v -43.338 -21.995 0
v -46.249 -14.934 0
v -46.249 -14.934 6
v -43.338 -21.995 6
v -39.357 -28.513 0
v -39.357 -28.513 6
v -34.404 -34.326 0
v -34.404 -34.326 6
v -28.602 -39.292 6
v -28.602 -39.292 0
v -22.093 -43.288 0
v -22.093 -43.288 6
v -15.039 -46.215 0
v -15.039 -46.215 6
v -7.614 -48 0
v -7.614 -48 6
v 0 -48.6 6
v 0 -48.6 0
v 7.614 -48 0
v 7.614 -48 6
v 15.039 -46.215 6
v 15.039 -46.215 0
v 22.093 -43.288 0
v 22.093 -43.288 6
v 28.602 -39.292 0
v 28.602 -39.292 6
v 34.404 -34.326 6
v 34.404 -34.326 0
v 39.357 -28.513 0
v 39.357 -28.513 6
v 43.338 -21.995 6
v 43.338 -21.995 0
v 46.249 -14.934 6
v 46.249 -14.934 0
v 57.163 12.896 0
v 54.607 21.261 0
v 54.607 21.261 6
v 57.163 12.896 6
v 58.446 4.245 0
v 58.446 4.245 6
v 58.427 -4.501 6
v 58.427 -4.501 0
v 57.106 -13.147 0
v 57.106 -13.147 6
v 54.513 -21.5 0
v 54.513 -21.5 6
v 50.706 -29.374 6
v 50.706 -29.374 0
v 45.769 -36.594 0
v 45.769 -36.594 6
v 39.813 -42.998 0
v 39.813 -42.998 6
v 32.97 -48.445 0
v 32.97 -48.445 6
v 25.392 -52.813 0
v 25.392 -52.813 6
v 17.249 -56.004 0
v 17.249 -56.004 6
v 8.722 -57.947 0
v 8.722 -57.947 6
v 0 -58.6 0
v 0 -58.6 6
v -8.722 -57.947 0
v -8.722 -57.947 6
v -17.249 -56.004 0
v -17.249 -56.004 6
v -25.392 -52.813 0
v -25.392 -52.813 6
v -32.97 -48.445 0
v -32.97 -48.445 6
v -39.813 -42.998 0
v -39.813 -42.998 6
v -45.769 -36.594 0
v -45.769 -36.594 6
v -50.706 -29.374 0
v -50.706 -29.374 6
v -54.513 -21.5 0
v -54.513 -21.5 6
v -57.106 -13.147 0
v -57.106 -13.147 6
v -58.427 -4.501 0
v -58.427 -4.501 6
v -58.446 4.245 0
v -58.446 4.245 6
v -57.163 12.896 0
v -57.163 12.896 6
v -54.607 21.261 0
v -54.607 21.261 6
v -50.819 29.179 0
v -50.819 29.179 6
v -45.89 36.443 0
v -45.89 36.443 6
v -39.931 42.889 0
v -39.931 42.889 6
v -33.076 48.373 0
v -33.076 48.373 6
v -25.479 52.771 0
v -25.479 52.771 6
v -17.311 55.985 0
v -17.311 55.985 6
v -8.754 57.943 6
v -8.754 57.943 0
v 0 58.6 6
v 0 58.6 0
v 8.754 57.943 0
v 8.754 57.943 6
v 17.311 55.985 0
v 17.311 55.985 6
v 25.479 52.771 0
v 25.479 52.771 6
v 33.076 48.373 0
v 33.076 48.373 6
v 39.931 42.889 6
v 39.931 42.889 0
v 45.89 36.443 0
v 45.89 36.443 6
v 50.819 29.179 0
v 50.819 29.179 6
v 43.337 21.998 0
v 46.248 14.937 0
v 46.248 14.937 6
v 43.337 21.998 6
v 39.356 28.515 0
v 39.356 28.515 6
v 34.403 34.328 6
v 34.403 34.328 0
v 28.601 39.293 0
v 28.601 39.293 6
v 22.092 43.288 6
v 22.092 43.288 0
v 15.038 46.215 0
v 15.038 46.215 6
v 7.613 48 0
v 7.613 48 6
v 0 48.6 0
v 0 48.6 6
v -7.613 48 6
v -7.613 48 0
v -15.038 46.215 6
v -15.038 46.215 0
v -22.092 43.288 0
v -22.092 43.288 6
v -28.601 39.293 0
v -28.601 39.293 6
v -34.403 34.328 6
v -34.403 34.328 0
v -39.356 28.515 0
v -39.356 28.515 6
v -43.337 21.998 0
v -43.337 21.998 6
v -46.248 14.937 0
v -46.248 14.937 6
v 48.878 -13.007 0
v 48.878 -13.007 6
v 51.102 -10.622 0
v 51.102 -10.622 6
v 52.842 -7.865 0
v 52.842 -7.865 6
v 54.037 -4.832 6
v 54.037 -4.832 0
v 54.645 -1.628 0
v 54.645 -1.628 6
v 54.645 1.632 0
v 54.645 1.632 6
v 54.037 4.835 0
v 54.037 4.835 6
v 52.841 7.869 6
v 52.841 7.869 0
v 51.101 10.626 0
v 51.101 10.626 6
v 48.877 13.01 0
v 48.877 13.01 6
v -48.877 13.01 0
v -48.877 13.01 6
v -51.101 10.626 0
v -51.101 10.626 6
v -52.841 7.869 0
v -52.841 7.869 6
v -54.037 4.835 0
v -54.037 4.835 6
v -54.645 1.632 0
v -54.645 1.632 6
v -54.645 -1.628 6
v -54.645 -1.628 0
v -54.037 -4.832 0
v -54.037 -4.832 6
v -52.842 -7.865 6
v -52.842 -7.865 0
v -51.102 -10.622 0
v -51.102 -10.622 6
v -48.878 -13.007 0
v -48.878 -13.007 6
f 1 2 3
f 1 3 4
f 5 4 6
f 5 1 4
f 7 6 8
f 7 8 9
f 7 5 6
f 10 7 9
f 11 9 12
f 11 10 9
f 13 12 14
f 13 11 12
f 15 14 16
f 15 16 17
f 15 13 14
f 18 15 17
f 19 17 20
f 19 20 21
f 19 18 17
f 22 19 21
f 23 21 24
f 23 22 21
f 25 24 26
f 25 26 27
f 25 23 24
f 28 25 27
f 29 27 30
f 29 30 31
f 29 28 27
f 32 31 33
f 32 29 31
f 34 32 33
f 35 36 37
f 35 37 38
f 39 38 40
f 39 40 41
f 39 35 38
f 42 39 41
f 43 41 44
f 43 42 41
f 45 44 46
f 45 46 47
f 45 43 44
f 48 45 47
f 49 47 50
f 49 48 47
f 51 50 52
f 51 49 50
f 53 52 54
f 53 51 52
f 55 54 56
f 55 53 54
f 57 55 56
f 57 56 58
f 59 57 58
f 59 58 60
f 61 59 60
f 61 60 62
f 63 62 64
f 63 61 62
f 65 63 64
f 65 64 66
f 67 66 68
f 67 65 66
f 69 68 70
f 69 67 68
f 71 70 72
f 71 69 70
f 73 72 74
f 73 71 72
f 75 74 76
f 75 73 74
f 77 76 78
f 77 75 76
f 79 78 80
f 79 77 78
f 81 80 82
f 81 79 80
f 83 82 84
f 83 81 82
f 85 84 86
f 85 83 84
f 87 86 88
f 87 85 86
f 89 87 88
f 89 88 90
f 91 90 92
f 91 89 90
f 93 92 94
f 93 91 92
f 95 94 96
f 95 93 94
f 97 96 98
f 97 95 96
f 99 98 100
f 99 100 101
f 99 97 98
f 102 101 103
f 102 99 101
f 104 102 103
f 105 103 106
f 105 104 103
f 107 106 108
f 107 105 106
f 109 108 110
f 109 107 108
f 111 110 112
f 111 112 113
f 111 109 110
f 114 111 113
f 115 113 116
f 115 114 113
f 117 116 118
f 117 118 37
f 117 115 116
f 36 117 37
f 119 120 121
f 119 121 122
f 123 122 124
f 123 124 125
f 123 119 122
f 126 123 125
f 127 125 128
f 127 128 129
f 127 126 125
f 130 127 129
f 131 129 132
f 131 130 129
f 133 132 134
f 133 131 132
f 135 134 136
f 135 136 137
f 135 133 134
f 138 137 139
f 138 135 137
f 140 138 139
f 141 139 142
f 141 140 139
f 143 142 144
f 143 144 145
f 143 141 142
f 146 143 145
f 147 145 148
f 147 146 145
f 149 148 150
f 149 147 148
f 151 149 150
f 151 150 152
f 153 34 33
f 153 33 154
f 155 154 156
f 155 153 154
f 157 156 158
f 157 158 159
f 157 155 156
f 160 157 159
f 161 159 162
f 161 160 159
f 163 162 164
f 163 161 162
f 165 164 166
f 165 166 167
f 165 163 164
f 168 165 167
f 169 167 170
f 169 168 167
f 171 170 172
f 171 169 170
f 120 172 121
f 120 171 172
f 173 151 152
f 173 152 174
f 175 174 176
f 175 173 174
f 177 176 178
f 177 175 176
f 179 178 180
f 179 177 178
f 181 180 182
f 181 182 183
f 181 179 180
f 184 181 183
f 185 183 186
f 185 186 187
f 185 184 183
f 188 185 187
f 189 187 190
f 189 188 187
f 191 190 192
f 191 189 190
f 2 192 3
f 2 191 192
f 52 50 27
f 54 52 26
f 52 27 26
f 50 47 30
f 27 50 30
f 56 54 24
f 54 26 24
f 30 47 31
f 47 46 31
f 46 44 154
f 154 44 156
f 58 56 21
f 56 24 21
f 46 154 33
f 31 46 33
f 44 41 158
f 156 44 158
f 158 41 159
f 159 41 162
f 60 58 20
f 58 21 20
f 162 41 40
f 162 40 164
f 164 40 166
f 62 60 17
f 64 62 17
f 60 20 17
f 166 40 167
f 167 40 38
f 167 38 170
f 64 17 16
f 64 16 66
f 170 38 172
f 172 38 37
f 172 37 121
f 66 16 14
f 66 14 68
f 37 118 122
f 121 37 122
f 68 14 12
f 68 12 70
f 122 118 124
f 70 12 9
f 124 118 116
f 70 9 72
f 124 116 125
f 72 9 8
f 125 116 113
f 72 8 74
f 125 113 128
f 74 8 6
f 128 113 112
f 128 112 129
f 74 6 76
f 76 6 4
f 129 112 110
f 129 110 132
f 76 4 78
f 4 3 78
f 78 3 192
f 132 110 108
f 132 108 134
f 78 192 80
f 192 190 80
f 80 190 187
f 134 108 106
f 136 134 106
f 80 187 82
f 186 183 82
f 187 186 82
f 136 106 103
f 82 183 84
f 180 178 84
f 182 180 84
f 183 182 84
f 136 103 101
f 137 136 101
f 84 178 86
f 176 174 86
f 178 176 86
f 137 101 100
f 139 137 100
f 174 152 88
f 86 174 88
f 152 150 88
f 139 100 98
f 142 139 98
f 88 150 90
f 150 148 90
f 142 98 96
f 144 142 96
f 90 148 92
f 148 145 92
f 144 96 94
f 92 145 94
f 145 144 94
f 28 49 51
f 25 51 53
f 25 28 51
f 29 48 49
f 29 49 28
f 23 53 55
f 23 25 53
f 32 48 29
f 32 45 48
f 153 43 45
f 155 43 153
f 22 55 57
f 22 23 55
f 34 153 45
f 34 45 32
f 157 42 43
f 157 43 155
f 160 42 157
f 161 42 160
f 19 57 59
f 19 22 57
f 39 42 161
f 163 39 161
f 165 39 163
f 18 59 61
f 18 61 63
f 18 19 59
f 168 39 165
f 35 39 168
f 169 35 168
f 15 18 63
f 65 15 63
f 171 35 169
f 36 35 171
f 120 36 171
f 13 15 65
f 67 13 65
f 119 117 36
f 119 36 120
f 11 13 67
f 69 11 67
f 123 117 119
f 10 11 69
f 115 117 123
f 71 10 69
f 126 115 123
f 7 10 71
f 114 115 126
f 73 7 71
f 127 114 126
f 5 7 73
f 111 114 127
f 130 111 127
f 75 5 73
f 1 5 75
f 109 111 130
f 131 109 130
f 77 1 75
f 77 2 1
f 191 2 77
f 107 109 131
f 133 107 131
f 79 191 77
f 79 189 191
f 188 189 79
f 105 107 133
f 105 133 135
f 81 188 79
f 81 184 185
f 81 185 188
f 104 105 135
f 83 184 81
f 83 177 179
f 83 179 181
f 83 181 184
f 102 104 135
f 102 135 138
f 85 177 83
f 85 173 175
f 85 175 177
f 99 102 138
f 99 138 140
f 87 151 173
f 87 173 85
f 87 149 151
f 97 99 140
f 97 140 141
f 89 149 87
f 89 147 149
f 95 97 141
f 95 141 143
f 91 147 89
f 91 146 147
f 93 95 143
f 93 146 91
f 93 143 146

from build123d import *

# Parameters (mm, degrees)
P_IDAT_VYSUNUT_M1_DEPTH = 6


with BuildPart() as part:
    # Skica1 → Přidat vysunutím1 (new body)
    with BuildSketch(Plane.XY):
        with BuildLine():
            ThreePointArc((54.607141883, 21.260763283), (0, -58.6), (-54.607141883, 21.260763283))
            ThreePointArc((-54.607141883, 21.260763283), (0, 58.6), (54.607141883, 21.260763283))
        make_face()
        with BuildLine():
            ThreePointArc((-46.248555772, -14.934225425), (0, -48.6), (46.248555772, -14.934225425))
            ThreePointArc((46.248555772, -14.934225425), (54.72152315, 0.001816211), (46.247564334, 14.937295377))
            ThreePointArc((46.247564334, 14.937295377), (0, 48.6), (-46.247564334, 14.937295377))
            ThreePointArc((-46.247564334, 14.937295377), (-54.72152315, 0.001816211), (-46.248555772, -14.934225425))
        make_face(mode=Mode.SUBTRACT)
    extrude(amount=P_IDAT_VYSUNUT_M1_DEPTH)


solid = part.part
